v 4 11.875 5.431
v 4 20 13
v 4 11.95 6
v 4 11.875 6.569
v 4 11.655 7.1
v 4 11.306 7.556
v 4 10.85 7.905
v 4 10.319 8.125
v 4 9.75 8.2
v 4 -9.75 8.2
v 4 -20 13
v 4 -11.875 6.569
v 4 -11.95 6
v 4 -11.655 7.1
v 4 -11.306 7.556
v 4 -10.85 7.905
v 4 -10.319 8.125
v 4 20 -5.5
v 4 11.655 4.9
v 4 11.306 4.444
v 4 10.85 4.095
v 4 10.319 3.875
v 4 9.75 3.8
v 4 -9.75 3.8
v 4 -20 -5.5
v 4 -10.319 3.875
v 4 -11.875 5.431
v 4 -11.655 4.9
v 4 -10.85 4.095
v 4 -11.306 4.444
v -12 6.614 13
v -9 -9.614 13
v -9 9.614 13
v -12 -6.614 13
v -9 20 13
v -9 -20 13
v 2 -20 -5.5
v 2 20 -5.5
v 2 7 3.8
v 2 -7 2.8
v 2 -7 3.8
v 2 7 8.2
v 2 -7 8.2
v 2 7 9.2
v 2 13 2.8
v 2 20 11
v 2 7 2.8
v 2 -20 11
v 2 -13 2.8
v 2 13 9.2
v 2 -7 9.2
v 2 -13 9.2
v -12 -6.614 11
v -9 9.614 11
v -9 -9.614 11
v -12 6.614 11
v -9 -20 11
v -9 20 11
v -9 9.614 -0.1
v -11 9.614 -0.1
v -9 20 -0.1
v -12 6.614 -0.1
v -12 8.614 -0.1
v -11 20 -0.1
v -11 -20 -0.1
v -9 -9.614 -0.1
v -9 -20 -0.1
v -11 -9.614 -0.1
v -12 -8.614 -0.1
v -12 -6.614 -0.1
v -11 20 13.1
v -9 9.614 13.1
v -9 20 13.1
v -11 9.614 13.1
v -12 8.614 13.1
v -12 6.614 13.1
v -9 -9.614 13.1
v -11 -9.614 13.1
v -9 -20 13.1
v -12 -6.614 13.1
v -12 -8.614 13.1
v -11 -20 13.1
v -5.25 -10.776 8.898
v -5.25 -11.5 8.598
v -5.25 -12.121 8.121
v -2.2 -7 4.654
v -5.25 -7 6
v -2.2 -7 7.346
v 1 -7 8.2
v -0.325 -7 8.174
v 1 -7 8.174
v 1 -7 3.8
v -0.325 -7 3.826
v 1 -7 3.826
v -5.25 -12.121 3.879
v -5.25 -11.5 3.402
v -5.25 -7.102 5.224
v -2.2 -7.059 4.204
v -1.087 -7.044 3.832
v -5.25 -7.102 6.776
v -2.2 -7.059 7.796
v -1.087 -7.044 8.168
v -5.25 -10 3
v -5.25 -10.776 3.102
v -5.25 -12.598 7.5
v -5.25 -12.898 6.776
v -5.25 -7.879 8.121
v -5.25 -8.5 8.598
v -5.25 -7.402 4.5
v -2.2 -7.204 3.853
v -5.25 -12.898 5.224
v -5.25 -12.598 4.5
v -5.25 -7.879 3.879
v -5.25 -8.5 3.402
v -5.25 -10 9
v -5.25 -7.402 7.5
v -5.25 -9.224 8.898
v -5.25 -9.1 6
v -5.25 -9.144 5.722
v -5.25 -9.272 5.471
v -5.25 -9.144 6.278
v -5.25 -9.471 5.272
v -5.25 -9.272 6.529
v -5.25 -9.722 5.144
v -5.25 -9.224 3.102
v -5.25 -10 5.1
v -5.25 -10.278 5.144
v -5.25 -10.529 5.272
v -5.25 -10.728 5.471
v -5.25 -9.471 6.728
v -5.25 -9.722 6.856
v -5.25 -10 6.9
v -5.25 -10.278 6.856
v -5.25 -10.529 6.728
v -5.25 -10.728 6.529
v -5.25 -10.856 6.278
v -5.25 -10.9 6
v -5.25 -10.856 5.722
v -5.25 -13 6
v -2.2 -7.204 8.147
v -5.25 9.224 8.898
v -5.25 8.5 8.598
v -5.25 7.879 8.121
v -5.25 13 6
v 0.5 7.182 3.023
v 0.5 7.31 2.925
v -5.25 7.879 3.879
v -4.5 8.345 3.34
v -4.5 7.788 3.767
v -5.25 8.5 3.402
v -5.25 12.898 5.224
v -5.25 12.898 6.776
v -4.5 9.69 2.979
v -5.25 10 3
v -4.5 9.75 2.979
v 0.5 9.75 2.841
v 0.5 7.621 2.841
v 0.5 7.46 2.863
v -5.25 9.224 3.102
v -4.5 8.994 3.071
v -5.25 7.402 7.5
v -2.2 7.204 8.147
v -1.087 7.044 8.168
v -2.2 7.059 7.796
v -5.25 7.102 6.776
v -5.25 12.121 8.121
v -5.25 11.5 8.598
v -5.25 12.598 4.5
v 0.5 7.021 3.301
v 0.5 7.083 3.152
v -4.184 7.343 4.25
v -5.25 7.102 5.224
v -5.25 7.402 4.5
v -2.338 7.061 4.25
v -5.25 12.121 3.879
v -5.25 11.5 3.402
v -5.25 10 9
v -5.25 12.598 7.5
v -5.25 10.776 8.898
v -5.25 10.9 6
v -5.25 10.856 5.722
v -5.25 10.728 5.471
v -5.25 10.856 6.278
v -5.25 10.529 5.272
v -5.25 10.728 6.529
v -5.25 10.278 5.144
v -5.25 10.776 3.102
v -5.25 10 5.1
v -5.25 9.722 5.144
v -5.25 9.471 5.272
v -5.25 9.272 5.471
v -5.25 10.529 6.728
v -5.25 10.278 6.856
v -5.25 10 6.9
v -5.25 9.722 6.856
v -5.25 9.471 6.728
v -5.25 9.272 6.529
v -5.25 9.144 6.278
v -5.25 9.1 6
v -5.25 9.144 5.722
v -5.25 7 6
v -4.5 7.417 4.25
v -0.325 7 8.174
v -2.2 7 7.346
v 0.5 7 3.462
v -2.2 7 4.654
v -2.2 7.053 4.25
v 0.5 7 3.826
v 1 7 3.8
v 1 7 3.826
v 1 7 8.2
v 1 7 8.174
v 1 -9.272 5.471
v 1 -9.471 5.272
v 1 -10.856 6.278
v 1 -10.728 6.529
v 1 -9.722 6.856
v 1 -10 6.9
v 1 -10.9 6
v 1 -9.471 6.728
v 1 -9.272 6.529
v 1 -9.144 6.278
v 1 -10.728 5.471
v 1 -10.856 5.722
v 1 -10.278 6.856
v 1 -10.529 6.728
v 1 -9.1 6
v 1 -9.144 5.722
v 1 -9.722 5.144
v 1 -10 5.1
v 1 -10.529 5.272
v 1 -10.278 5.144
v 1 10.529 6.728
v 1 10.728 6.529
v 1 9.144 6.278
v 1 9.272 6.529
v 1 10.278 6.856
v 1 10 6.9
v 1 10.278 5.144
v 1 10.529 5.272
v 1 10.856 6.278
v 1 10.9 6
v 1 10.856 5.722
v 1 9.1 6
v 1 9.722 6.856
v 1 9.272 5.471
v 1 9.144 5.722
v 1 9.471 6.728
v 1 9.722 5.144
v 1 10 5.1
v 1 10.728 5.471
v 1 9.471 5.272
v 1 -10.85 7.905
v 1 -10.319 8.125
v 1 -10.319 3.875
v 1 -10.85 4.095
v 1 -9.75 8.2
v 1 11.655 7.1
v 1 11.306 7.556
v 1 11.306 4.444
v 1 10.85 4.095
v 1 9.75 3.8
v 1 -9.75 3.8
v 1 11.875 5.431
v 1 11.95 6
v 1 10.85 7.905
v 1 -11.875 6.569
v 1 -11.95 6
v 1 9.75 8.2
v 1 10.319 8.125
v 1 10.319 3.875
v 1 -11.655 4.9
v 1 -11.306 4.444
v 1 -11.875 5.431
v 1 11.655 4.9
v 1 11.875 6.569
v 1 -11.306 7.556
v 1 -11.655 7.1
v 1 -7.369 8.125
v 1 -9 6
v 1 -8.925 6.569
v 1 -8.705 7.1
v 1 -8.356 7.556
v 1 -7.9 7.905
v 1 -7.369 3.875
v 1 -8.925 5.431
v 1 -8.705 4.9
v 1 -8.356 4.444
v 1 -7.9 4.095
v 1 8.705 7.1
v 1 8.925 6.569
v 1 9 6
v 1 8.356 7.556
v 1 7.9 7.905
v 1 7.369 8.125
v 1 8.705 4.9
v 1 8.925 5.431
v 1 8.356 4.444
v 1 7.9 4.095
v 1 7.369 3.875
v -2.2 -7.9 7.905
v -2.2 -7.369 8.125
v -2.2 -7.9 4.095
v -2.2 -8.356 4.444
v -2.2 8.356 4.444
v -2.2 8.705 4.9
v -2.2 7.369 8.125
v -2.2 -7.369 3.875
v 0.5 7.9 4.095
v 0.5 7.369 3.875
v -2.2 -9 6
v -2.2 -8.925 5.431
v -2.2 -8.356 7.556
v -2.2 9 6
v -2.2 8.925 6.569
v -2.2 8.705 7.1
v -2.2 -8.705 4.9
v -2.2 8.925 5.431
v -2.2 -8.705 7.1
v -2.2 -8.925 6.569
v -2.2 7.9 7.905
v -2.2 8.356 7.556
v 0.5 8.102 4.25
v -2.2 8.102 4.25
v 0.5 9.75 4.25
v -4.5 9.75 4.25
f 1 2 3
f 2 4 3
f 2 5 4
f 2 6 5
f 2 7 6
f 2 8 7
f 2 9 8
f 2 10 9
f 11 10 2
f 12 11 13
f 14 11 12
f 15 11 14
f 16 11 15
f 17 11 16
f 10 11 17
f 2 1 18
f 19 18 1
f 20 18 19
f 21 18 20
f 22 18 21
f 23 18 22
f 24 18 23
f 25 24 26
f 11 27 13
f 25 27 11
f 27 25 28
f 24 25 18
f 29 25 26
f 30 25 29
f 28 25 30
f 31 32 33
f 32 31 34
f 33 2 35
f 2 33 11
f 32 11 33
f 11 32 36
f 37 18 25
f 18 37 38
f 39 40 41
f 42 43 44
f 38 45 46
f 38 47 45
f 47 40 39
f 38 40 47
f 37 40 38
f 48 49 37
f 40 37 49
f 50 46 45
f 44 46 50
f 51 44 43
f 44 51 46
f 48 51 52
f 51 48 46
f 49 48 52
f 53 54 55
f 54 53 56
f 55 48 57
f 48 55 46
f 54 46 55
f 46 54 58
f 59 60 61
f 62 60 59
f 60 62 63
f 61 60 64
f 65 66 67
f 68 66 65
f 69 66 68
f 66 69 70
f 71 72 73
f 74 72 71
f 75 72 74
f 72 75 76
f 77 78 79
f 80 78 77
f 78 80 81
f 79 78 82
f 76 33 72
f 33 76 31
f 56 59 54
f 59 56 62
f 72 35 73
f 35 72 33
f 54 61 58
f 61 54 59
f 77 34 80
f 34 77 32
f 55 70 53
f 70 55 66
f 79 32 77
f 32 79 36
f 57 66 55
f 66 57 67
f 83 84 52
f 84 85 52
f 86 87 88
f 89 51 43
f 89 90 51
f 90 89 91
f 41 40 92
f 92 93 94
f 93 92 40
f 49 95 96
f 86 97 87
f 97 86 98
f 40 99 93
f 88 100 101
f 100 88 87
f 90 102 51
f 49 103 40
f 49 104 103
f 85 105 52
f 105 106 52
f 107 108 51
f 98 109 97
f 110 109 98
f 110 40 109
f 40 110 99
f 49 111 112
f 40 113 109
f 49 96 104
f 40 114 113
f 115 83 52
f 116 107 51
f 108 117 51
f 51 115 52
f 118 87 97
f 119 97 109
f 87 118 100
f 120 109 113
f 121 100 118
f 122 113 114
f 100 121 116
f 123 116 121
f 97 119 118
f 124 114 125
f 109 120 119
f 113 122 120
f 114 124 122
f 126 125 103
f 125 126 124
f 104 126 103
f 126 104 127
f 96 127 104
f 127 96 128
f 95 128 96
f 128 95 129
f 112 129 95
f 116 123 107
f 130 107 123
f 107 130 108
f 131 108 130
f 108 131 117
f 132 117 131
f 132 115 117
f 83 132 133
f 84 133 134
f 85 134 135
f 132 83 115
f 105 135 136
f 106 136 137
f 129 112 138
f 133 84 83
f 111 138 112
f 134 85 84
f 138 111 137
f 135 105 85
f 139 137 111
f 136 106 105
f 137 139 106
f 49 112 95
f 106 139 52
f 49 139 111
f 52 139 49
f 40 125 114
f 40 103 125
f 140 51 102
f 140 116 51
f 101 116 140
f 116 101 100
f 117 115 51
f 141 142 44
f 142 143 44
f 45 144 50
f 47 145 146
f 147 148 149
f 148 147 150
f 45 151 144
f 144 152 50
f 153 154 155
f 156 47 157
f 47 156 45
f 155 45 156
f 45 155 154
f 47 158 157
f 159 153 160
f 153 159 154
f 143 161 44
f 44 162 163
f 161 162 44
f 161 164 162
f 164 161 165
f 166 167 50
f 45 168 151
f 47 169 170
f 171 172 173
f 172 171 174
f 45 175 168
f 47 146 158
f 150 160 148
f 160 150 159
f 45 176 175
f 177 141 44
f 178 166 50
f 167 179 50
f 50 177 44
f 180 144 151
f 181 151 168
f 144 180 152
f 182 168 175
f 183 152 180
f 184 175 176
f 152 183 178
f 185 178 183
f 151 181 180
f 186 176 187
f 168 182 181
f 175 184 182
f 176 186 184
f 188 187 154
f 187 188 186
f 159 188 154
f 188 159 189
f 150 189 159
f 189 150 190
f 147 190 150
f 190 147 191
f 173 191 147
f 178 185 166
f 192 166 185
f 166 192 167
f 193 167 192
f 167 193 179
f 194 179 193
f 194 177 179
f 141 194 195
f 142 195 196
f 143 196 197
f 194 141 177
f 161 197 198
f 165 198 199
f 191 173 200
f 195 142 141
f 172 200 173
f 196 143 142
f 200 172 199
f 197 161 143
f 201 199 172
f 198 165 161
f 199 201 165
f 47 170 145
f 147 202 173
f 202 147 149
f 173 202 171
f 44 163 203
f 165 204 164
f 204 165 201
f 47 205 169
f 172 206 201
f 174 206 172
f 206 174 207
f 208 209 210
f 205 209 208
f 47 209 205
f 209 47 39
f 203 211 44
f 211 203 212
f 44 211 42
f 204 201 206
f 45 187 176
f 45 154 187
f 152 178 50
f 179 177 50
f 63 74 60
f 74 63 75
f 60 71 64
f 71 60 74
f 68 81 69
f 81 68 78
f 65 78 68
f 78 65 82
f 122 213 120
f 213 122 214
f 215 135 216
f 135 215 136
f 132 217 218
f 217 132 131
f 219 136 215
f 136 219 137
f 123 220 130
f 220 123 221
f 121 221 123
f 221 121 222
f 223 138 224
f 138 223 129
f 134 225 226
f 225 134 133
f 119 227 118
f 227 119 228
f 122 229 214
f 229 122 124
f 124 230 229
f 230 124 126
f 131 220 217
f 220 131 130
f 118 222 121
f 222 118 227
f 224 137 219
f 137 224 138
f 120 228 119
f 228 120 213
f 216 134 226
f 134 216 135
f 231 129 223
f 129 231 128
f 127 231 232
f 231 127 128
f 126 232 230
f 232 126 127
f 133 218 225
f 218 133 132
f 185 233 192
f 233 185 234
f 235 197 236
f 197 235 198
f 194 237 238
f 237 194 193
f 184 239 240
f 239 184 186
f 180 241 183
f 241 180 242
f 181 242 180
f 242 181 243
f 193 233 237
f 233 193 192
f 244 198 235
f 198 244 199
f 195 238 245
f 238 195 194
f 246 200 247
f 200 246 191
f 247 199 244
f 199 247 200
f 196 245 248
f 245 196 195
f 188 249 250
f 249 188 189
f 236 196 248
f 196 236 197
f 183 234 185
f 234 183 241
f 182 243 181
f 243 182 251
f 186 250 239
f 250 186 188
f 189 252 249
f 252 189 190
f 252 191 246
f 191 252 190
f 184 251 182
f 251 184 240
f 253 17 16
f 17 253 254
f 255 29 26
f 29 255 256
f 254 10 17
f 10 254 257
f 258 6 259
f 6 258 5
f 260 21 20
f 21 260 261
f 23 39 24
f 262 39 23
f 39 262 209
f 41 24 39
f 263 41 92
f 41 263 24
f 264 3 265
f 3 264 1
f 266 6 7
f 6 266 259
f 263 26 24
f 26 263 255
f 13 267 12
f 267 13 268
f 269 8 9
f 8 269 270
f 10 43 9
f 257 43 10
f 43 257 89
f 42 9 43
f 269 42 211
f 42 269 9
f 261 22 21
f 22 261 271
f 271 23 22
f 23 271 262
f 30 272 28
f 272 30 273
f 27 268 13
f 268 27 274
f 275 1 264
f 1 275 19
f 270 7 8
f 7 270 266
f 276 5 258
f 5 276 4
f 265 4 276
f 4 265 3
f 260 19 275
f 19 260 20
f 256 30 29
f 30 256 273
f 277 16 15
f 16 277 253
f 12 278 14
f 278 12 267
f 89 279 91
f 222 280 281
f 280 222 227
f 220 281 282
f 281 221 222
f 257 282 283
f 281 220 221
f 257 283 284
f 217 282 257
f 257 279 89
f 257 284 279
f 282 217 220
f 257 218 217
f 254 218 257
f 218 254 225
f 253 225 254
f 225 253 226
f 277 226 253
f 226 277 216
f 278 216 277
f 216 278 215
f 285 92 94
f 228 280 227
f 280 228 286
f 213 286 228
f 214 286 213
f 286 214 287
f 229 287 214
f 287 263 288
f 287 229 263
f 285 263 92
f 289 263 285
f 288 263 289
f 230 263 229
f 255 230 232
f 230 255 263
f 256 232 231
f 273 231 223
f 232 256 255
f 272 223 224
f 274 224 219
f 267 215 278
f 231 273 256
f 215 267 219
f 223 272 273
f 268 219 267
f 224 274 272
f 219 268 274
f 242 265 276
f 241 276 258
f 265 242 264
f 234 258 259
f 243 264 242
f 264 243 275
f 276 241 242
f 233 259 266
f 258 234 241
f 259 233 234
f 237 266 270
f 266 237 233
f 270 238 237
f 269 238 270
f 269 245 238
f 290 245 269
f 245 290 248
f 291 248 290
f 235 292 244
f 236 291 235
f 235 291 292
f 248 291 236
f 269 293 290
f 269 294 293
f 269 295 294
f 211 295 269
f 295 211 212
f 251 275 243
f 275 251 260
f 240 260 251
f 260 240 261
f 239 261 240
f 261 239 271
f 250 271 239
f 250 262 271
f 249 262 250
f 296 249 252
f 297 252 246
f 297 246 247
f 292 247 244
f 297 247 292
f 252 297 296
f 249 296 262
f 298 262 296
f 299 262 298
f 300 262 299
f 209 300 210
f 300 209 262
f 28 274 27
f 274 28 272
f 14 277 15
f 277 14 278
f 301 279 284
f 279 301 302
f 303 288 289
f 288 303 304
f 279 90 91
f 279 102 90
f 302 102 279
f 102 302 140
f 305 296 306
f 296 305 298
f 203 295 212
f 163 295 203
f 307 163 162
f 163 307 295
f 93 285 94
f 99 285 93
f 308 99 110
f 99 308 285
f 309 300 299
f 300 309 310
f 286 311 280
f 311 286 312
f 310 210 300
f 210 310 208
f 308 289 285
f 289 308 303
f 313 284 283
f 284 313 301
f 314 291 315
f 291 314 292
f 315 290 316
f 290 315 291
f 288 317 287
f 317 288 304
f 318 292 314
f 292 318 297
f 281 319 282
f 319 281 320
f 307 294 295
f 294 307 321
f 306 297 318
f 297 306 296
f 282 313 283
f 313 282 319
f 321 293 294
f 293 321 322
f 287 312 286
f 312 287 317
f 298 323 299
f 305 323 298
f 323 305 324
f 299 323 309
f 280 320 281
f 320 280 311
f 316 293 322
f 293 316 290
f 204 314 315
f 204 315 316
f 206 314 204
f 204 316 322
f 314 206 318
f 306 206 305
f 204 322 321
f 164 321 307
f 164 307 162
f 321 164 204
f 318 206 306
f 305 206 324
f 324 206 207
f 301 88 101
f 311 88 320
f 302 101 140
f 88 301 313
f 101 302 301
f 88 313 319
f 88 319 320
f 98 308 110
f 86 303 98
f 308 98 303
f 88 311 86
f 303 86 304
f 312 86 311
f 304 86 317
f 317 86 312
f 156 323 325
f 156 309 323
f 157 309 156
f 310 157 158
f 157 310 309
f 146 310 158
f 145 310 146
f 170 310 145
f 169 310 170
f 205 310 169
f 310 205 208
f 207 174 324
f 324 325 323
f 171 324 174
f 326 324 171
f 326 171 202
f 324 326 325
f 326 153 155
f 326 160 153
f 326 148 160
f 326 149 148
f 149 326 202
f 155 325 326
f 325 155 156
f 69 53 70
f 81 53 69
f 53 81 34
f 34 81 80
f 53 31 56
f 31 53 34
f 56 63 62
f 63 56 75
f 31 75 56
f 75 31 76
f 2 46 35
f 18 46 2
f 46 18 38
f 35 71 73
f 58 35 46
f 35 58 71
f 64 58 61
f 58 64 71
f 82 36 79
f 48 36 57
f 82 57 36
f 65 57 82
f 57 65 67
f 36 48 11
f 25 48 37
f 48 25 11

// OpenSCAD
// =========================================================================
// Quick Test-Fit Coupons: USB-C Port & Magnetic Pogo Pin Connector
// Isolated cutouts from the 7-segment housing for rapid test printing.
// =========================================================================

include <./7segment_pogo.scad>

// Ensure full display elements are hidden
show_frontplate_black = false;
show_frontplate_white = false;
show_backplate = false;
show_pogo_hardware = false;

/* [Coupon Selection] */
coupon_type = "pogo"; // ["usb", "pogo", "both"]

// Coupon 1: Flat Rectangular 40 x 20 mm Plate (2.0mm thick) with 14.1 x 7.2 mm USB Cutout
module coupon_usb_c() {
    plate_w = 40.0;      // Exact 40.0mm width
    plate_h = 20.0;      // Exact 20.0mm height
    plate_t = 2.0;       // 2.0mm housing wall thickness
    usb_w = 14.1;        // 14.1mm USB-C width
    usb_h = 7.2;         // 7.2mm USB-C height
    
    difference() {
        // Flat rectangular plate 40 x 20 x 2 mm
        cube([plate_w, plate_h, plate_t], center = true);
                
        // Centered USB-C through-hole cutout 14.1 x 7.2 mm
        cube([usb_w, usb_h, plate_t + 1.0], center = true);
    }
}

// Coupon 2: 4-Pin Magnetic Pogo Pin Connector Wall Cutout (with M2 screw bosses)
module coupon_pogo_pin() {
    wall_x = digit_width / 2; // Right outer wall face
    
    translate([-wall_x + 4.0, 0, 0]) {
        intersection() {
            // Full Panel 1 housing with pogo mounting features
            frontplate_black(panel_id = 1);
            
            // Bounding box around the Pogo pocket & bosses (16mm thick x 40mm wide x full housing Z height)
            translate([wall_x - 6.0, 0, (total_depth - backplate_thick) / 2])
                cube([20.0, 40.0, total_depth + backplate_thick + 4.0], center = true);
        }
    }
}

// Render Logic
if (coupon_type == "usb") {
    coupon_usb_c();
} else if (coupon_type == "pogo") {
    coupon_pogo_pin();
} else if (coupon_type == "both") {
    translate([-14, 0, 0]) coupon_usb_c();
    translate([14, 0, 0]) coupon_pogo_pin();
}
